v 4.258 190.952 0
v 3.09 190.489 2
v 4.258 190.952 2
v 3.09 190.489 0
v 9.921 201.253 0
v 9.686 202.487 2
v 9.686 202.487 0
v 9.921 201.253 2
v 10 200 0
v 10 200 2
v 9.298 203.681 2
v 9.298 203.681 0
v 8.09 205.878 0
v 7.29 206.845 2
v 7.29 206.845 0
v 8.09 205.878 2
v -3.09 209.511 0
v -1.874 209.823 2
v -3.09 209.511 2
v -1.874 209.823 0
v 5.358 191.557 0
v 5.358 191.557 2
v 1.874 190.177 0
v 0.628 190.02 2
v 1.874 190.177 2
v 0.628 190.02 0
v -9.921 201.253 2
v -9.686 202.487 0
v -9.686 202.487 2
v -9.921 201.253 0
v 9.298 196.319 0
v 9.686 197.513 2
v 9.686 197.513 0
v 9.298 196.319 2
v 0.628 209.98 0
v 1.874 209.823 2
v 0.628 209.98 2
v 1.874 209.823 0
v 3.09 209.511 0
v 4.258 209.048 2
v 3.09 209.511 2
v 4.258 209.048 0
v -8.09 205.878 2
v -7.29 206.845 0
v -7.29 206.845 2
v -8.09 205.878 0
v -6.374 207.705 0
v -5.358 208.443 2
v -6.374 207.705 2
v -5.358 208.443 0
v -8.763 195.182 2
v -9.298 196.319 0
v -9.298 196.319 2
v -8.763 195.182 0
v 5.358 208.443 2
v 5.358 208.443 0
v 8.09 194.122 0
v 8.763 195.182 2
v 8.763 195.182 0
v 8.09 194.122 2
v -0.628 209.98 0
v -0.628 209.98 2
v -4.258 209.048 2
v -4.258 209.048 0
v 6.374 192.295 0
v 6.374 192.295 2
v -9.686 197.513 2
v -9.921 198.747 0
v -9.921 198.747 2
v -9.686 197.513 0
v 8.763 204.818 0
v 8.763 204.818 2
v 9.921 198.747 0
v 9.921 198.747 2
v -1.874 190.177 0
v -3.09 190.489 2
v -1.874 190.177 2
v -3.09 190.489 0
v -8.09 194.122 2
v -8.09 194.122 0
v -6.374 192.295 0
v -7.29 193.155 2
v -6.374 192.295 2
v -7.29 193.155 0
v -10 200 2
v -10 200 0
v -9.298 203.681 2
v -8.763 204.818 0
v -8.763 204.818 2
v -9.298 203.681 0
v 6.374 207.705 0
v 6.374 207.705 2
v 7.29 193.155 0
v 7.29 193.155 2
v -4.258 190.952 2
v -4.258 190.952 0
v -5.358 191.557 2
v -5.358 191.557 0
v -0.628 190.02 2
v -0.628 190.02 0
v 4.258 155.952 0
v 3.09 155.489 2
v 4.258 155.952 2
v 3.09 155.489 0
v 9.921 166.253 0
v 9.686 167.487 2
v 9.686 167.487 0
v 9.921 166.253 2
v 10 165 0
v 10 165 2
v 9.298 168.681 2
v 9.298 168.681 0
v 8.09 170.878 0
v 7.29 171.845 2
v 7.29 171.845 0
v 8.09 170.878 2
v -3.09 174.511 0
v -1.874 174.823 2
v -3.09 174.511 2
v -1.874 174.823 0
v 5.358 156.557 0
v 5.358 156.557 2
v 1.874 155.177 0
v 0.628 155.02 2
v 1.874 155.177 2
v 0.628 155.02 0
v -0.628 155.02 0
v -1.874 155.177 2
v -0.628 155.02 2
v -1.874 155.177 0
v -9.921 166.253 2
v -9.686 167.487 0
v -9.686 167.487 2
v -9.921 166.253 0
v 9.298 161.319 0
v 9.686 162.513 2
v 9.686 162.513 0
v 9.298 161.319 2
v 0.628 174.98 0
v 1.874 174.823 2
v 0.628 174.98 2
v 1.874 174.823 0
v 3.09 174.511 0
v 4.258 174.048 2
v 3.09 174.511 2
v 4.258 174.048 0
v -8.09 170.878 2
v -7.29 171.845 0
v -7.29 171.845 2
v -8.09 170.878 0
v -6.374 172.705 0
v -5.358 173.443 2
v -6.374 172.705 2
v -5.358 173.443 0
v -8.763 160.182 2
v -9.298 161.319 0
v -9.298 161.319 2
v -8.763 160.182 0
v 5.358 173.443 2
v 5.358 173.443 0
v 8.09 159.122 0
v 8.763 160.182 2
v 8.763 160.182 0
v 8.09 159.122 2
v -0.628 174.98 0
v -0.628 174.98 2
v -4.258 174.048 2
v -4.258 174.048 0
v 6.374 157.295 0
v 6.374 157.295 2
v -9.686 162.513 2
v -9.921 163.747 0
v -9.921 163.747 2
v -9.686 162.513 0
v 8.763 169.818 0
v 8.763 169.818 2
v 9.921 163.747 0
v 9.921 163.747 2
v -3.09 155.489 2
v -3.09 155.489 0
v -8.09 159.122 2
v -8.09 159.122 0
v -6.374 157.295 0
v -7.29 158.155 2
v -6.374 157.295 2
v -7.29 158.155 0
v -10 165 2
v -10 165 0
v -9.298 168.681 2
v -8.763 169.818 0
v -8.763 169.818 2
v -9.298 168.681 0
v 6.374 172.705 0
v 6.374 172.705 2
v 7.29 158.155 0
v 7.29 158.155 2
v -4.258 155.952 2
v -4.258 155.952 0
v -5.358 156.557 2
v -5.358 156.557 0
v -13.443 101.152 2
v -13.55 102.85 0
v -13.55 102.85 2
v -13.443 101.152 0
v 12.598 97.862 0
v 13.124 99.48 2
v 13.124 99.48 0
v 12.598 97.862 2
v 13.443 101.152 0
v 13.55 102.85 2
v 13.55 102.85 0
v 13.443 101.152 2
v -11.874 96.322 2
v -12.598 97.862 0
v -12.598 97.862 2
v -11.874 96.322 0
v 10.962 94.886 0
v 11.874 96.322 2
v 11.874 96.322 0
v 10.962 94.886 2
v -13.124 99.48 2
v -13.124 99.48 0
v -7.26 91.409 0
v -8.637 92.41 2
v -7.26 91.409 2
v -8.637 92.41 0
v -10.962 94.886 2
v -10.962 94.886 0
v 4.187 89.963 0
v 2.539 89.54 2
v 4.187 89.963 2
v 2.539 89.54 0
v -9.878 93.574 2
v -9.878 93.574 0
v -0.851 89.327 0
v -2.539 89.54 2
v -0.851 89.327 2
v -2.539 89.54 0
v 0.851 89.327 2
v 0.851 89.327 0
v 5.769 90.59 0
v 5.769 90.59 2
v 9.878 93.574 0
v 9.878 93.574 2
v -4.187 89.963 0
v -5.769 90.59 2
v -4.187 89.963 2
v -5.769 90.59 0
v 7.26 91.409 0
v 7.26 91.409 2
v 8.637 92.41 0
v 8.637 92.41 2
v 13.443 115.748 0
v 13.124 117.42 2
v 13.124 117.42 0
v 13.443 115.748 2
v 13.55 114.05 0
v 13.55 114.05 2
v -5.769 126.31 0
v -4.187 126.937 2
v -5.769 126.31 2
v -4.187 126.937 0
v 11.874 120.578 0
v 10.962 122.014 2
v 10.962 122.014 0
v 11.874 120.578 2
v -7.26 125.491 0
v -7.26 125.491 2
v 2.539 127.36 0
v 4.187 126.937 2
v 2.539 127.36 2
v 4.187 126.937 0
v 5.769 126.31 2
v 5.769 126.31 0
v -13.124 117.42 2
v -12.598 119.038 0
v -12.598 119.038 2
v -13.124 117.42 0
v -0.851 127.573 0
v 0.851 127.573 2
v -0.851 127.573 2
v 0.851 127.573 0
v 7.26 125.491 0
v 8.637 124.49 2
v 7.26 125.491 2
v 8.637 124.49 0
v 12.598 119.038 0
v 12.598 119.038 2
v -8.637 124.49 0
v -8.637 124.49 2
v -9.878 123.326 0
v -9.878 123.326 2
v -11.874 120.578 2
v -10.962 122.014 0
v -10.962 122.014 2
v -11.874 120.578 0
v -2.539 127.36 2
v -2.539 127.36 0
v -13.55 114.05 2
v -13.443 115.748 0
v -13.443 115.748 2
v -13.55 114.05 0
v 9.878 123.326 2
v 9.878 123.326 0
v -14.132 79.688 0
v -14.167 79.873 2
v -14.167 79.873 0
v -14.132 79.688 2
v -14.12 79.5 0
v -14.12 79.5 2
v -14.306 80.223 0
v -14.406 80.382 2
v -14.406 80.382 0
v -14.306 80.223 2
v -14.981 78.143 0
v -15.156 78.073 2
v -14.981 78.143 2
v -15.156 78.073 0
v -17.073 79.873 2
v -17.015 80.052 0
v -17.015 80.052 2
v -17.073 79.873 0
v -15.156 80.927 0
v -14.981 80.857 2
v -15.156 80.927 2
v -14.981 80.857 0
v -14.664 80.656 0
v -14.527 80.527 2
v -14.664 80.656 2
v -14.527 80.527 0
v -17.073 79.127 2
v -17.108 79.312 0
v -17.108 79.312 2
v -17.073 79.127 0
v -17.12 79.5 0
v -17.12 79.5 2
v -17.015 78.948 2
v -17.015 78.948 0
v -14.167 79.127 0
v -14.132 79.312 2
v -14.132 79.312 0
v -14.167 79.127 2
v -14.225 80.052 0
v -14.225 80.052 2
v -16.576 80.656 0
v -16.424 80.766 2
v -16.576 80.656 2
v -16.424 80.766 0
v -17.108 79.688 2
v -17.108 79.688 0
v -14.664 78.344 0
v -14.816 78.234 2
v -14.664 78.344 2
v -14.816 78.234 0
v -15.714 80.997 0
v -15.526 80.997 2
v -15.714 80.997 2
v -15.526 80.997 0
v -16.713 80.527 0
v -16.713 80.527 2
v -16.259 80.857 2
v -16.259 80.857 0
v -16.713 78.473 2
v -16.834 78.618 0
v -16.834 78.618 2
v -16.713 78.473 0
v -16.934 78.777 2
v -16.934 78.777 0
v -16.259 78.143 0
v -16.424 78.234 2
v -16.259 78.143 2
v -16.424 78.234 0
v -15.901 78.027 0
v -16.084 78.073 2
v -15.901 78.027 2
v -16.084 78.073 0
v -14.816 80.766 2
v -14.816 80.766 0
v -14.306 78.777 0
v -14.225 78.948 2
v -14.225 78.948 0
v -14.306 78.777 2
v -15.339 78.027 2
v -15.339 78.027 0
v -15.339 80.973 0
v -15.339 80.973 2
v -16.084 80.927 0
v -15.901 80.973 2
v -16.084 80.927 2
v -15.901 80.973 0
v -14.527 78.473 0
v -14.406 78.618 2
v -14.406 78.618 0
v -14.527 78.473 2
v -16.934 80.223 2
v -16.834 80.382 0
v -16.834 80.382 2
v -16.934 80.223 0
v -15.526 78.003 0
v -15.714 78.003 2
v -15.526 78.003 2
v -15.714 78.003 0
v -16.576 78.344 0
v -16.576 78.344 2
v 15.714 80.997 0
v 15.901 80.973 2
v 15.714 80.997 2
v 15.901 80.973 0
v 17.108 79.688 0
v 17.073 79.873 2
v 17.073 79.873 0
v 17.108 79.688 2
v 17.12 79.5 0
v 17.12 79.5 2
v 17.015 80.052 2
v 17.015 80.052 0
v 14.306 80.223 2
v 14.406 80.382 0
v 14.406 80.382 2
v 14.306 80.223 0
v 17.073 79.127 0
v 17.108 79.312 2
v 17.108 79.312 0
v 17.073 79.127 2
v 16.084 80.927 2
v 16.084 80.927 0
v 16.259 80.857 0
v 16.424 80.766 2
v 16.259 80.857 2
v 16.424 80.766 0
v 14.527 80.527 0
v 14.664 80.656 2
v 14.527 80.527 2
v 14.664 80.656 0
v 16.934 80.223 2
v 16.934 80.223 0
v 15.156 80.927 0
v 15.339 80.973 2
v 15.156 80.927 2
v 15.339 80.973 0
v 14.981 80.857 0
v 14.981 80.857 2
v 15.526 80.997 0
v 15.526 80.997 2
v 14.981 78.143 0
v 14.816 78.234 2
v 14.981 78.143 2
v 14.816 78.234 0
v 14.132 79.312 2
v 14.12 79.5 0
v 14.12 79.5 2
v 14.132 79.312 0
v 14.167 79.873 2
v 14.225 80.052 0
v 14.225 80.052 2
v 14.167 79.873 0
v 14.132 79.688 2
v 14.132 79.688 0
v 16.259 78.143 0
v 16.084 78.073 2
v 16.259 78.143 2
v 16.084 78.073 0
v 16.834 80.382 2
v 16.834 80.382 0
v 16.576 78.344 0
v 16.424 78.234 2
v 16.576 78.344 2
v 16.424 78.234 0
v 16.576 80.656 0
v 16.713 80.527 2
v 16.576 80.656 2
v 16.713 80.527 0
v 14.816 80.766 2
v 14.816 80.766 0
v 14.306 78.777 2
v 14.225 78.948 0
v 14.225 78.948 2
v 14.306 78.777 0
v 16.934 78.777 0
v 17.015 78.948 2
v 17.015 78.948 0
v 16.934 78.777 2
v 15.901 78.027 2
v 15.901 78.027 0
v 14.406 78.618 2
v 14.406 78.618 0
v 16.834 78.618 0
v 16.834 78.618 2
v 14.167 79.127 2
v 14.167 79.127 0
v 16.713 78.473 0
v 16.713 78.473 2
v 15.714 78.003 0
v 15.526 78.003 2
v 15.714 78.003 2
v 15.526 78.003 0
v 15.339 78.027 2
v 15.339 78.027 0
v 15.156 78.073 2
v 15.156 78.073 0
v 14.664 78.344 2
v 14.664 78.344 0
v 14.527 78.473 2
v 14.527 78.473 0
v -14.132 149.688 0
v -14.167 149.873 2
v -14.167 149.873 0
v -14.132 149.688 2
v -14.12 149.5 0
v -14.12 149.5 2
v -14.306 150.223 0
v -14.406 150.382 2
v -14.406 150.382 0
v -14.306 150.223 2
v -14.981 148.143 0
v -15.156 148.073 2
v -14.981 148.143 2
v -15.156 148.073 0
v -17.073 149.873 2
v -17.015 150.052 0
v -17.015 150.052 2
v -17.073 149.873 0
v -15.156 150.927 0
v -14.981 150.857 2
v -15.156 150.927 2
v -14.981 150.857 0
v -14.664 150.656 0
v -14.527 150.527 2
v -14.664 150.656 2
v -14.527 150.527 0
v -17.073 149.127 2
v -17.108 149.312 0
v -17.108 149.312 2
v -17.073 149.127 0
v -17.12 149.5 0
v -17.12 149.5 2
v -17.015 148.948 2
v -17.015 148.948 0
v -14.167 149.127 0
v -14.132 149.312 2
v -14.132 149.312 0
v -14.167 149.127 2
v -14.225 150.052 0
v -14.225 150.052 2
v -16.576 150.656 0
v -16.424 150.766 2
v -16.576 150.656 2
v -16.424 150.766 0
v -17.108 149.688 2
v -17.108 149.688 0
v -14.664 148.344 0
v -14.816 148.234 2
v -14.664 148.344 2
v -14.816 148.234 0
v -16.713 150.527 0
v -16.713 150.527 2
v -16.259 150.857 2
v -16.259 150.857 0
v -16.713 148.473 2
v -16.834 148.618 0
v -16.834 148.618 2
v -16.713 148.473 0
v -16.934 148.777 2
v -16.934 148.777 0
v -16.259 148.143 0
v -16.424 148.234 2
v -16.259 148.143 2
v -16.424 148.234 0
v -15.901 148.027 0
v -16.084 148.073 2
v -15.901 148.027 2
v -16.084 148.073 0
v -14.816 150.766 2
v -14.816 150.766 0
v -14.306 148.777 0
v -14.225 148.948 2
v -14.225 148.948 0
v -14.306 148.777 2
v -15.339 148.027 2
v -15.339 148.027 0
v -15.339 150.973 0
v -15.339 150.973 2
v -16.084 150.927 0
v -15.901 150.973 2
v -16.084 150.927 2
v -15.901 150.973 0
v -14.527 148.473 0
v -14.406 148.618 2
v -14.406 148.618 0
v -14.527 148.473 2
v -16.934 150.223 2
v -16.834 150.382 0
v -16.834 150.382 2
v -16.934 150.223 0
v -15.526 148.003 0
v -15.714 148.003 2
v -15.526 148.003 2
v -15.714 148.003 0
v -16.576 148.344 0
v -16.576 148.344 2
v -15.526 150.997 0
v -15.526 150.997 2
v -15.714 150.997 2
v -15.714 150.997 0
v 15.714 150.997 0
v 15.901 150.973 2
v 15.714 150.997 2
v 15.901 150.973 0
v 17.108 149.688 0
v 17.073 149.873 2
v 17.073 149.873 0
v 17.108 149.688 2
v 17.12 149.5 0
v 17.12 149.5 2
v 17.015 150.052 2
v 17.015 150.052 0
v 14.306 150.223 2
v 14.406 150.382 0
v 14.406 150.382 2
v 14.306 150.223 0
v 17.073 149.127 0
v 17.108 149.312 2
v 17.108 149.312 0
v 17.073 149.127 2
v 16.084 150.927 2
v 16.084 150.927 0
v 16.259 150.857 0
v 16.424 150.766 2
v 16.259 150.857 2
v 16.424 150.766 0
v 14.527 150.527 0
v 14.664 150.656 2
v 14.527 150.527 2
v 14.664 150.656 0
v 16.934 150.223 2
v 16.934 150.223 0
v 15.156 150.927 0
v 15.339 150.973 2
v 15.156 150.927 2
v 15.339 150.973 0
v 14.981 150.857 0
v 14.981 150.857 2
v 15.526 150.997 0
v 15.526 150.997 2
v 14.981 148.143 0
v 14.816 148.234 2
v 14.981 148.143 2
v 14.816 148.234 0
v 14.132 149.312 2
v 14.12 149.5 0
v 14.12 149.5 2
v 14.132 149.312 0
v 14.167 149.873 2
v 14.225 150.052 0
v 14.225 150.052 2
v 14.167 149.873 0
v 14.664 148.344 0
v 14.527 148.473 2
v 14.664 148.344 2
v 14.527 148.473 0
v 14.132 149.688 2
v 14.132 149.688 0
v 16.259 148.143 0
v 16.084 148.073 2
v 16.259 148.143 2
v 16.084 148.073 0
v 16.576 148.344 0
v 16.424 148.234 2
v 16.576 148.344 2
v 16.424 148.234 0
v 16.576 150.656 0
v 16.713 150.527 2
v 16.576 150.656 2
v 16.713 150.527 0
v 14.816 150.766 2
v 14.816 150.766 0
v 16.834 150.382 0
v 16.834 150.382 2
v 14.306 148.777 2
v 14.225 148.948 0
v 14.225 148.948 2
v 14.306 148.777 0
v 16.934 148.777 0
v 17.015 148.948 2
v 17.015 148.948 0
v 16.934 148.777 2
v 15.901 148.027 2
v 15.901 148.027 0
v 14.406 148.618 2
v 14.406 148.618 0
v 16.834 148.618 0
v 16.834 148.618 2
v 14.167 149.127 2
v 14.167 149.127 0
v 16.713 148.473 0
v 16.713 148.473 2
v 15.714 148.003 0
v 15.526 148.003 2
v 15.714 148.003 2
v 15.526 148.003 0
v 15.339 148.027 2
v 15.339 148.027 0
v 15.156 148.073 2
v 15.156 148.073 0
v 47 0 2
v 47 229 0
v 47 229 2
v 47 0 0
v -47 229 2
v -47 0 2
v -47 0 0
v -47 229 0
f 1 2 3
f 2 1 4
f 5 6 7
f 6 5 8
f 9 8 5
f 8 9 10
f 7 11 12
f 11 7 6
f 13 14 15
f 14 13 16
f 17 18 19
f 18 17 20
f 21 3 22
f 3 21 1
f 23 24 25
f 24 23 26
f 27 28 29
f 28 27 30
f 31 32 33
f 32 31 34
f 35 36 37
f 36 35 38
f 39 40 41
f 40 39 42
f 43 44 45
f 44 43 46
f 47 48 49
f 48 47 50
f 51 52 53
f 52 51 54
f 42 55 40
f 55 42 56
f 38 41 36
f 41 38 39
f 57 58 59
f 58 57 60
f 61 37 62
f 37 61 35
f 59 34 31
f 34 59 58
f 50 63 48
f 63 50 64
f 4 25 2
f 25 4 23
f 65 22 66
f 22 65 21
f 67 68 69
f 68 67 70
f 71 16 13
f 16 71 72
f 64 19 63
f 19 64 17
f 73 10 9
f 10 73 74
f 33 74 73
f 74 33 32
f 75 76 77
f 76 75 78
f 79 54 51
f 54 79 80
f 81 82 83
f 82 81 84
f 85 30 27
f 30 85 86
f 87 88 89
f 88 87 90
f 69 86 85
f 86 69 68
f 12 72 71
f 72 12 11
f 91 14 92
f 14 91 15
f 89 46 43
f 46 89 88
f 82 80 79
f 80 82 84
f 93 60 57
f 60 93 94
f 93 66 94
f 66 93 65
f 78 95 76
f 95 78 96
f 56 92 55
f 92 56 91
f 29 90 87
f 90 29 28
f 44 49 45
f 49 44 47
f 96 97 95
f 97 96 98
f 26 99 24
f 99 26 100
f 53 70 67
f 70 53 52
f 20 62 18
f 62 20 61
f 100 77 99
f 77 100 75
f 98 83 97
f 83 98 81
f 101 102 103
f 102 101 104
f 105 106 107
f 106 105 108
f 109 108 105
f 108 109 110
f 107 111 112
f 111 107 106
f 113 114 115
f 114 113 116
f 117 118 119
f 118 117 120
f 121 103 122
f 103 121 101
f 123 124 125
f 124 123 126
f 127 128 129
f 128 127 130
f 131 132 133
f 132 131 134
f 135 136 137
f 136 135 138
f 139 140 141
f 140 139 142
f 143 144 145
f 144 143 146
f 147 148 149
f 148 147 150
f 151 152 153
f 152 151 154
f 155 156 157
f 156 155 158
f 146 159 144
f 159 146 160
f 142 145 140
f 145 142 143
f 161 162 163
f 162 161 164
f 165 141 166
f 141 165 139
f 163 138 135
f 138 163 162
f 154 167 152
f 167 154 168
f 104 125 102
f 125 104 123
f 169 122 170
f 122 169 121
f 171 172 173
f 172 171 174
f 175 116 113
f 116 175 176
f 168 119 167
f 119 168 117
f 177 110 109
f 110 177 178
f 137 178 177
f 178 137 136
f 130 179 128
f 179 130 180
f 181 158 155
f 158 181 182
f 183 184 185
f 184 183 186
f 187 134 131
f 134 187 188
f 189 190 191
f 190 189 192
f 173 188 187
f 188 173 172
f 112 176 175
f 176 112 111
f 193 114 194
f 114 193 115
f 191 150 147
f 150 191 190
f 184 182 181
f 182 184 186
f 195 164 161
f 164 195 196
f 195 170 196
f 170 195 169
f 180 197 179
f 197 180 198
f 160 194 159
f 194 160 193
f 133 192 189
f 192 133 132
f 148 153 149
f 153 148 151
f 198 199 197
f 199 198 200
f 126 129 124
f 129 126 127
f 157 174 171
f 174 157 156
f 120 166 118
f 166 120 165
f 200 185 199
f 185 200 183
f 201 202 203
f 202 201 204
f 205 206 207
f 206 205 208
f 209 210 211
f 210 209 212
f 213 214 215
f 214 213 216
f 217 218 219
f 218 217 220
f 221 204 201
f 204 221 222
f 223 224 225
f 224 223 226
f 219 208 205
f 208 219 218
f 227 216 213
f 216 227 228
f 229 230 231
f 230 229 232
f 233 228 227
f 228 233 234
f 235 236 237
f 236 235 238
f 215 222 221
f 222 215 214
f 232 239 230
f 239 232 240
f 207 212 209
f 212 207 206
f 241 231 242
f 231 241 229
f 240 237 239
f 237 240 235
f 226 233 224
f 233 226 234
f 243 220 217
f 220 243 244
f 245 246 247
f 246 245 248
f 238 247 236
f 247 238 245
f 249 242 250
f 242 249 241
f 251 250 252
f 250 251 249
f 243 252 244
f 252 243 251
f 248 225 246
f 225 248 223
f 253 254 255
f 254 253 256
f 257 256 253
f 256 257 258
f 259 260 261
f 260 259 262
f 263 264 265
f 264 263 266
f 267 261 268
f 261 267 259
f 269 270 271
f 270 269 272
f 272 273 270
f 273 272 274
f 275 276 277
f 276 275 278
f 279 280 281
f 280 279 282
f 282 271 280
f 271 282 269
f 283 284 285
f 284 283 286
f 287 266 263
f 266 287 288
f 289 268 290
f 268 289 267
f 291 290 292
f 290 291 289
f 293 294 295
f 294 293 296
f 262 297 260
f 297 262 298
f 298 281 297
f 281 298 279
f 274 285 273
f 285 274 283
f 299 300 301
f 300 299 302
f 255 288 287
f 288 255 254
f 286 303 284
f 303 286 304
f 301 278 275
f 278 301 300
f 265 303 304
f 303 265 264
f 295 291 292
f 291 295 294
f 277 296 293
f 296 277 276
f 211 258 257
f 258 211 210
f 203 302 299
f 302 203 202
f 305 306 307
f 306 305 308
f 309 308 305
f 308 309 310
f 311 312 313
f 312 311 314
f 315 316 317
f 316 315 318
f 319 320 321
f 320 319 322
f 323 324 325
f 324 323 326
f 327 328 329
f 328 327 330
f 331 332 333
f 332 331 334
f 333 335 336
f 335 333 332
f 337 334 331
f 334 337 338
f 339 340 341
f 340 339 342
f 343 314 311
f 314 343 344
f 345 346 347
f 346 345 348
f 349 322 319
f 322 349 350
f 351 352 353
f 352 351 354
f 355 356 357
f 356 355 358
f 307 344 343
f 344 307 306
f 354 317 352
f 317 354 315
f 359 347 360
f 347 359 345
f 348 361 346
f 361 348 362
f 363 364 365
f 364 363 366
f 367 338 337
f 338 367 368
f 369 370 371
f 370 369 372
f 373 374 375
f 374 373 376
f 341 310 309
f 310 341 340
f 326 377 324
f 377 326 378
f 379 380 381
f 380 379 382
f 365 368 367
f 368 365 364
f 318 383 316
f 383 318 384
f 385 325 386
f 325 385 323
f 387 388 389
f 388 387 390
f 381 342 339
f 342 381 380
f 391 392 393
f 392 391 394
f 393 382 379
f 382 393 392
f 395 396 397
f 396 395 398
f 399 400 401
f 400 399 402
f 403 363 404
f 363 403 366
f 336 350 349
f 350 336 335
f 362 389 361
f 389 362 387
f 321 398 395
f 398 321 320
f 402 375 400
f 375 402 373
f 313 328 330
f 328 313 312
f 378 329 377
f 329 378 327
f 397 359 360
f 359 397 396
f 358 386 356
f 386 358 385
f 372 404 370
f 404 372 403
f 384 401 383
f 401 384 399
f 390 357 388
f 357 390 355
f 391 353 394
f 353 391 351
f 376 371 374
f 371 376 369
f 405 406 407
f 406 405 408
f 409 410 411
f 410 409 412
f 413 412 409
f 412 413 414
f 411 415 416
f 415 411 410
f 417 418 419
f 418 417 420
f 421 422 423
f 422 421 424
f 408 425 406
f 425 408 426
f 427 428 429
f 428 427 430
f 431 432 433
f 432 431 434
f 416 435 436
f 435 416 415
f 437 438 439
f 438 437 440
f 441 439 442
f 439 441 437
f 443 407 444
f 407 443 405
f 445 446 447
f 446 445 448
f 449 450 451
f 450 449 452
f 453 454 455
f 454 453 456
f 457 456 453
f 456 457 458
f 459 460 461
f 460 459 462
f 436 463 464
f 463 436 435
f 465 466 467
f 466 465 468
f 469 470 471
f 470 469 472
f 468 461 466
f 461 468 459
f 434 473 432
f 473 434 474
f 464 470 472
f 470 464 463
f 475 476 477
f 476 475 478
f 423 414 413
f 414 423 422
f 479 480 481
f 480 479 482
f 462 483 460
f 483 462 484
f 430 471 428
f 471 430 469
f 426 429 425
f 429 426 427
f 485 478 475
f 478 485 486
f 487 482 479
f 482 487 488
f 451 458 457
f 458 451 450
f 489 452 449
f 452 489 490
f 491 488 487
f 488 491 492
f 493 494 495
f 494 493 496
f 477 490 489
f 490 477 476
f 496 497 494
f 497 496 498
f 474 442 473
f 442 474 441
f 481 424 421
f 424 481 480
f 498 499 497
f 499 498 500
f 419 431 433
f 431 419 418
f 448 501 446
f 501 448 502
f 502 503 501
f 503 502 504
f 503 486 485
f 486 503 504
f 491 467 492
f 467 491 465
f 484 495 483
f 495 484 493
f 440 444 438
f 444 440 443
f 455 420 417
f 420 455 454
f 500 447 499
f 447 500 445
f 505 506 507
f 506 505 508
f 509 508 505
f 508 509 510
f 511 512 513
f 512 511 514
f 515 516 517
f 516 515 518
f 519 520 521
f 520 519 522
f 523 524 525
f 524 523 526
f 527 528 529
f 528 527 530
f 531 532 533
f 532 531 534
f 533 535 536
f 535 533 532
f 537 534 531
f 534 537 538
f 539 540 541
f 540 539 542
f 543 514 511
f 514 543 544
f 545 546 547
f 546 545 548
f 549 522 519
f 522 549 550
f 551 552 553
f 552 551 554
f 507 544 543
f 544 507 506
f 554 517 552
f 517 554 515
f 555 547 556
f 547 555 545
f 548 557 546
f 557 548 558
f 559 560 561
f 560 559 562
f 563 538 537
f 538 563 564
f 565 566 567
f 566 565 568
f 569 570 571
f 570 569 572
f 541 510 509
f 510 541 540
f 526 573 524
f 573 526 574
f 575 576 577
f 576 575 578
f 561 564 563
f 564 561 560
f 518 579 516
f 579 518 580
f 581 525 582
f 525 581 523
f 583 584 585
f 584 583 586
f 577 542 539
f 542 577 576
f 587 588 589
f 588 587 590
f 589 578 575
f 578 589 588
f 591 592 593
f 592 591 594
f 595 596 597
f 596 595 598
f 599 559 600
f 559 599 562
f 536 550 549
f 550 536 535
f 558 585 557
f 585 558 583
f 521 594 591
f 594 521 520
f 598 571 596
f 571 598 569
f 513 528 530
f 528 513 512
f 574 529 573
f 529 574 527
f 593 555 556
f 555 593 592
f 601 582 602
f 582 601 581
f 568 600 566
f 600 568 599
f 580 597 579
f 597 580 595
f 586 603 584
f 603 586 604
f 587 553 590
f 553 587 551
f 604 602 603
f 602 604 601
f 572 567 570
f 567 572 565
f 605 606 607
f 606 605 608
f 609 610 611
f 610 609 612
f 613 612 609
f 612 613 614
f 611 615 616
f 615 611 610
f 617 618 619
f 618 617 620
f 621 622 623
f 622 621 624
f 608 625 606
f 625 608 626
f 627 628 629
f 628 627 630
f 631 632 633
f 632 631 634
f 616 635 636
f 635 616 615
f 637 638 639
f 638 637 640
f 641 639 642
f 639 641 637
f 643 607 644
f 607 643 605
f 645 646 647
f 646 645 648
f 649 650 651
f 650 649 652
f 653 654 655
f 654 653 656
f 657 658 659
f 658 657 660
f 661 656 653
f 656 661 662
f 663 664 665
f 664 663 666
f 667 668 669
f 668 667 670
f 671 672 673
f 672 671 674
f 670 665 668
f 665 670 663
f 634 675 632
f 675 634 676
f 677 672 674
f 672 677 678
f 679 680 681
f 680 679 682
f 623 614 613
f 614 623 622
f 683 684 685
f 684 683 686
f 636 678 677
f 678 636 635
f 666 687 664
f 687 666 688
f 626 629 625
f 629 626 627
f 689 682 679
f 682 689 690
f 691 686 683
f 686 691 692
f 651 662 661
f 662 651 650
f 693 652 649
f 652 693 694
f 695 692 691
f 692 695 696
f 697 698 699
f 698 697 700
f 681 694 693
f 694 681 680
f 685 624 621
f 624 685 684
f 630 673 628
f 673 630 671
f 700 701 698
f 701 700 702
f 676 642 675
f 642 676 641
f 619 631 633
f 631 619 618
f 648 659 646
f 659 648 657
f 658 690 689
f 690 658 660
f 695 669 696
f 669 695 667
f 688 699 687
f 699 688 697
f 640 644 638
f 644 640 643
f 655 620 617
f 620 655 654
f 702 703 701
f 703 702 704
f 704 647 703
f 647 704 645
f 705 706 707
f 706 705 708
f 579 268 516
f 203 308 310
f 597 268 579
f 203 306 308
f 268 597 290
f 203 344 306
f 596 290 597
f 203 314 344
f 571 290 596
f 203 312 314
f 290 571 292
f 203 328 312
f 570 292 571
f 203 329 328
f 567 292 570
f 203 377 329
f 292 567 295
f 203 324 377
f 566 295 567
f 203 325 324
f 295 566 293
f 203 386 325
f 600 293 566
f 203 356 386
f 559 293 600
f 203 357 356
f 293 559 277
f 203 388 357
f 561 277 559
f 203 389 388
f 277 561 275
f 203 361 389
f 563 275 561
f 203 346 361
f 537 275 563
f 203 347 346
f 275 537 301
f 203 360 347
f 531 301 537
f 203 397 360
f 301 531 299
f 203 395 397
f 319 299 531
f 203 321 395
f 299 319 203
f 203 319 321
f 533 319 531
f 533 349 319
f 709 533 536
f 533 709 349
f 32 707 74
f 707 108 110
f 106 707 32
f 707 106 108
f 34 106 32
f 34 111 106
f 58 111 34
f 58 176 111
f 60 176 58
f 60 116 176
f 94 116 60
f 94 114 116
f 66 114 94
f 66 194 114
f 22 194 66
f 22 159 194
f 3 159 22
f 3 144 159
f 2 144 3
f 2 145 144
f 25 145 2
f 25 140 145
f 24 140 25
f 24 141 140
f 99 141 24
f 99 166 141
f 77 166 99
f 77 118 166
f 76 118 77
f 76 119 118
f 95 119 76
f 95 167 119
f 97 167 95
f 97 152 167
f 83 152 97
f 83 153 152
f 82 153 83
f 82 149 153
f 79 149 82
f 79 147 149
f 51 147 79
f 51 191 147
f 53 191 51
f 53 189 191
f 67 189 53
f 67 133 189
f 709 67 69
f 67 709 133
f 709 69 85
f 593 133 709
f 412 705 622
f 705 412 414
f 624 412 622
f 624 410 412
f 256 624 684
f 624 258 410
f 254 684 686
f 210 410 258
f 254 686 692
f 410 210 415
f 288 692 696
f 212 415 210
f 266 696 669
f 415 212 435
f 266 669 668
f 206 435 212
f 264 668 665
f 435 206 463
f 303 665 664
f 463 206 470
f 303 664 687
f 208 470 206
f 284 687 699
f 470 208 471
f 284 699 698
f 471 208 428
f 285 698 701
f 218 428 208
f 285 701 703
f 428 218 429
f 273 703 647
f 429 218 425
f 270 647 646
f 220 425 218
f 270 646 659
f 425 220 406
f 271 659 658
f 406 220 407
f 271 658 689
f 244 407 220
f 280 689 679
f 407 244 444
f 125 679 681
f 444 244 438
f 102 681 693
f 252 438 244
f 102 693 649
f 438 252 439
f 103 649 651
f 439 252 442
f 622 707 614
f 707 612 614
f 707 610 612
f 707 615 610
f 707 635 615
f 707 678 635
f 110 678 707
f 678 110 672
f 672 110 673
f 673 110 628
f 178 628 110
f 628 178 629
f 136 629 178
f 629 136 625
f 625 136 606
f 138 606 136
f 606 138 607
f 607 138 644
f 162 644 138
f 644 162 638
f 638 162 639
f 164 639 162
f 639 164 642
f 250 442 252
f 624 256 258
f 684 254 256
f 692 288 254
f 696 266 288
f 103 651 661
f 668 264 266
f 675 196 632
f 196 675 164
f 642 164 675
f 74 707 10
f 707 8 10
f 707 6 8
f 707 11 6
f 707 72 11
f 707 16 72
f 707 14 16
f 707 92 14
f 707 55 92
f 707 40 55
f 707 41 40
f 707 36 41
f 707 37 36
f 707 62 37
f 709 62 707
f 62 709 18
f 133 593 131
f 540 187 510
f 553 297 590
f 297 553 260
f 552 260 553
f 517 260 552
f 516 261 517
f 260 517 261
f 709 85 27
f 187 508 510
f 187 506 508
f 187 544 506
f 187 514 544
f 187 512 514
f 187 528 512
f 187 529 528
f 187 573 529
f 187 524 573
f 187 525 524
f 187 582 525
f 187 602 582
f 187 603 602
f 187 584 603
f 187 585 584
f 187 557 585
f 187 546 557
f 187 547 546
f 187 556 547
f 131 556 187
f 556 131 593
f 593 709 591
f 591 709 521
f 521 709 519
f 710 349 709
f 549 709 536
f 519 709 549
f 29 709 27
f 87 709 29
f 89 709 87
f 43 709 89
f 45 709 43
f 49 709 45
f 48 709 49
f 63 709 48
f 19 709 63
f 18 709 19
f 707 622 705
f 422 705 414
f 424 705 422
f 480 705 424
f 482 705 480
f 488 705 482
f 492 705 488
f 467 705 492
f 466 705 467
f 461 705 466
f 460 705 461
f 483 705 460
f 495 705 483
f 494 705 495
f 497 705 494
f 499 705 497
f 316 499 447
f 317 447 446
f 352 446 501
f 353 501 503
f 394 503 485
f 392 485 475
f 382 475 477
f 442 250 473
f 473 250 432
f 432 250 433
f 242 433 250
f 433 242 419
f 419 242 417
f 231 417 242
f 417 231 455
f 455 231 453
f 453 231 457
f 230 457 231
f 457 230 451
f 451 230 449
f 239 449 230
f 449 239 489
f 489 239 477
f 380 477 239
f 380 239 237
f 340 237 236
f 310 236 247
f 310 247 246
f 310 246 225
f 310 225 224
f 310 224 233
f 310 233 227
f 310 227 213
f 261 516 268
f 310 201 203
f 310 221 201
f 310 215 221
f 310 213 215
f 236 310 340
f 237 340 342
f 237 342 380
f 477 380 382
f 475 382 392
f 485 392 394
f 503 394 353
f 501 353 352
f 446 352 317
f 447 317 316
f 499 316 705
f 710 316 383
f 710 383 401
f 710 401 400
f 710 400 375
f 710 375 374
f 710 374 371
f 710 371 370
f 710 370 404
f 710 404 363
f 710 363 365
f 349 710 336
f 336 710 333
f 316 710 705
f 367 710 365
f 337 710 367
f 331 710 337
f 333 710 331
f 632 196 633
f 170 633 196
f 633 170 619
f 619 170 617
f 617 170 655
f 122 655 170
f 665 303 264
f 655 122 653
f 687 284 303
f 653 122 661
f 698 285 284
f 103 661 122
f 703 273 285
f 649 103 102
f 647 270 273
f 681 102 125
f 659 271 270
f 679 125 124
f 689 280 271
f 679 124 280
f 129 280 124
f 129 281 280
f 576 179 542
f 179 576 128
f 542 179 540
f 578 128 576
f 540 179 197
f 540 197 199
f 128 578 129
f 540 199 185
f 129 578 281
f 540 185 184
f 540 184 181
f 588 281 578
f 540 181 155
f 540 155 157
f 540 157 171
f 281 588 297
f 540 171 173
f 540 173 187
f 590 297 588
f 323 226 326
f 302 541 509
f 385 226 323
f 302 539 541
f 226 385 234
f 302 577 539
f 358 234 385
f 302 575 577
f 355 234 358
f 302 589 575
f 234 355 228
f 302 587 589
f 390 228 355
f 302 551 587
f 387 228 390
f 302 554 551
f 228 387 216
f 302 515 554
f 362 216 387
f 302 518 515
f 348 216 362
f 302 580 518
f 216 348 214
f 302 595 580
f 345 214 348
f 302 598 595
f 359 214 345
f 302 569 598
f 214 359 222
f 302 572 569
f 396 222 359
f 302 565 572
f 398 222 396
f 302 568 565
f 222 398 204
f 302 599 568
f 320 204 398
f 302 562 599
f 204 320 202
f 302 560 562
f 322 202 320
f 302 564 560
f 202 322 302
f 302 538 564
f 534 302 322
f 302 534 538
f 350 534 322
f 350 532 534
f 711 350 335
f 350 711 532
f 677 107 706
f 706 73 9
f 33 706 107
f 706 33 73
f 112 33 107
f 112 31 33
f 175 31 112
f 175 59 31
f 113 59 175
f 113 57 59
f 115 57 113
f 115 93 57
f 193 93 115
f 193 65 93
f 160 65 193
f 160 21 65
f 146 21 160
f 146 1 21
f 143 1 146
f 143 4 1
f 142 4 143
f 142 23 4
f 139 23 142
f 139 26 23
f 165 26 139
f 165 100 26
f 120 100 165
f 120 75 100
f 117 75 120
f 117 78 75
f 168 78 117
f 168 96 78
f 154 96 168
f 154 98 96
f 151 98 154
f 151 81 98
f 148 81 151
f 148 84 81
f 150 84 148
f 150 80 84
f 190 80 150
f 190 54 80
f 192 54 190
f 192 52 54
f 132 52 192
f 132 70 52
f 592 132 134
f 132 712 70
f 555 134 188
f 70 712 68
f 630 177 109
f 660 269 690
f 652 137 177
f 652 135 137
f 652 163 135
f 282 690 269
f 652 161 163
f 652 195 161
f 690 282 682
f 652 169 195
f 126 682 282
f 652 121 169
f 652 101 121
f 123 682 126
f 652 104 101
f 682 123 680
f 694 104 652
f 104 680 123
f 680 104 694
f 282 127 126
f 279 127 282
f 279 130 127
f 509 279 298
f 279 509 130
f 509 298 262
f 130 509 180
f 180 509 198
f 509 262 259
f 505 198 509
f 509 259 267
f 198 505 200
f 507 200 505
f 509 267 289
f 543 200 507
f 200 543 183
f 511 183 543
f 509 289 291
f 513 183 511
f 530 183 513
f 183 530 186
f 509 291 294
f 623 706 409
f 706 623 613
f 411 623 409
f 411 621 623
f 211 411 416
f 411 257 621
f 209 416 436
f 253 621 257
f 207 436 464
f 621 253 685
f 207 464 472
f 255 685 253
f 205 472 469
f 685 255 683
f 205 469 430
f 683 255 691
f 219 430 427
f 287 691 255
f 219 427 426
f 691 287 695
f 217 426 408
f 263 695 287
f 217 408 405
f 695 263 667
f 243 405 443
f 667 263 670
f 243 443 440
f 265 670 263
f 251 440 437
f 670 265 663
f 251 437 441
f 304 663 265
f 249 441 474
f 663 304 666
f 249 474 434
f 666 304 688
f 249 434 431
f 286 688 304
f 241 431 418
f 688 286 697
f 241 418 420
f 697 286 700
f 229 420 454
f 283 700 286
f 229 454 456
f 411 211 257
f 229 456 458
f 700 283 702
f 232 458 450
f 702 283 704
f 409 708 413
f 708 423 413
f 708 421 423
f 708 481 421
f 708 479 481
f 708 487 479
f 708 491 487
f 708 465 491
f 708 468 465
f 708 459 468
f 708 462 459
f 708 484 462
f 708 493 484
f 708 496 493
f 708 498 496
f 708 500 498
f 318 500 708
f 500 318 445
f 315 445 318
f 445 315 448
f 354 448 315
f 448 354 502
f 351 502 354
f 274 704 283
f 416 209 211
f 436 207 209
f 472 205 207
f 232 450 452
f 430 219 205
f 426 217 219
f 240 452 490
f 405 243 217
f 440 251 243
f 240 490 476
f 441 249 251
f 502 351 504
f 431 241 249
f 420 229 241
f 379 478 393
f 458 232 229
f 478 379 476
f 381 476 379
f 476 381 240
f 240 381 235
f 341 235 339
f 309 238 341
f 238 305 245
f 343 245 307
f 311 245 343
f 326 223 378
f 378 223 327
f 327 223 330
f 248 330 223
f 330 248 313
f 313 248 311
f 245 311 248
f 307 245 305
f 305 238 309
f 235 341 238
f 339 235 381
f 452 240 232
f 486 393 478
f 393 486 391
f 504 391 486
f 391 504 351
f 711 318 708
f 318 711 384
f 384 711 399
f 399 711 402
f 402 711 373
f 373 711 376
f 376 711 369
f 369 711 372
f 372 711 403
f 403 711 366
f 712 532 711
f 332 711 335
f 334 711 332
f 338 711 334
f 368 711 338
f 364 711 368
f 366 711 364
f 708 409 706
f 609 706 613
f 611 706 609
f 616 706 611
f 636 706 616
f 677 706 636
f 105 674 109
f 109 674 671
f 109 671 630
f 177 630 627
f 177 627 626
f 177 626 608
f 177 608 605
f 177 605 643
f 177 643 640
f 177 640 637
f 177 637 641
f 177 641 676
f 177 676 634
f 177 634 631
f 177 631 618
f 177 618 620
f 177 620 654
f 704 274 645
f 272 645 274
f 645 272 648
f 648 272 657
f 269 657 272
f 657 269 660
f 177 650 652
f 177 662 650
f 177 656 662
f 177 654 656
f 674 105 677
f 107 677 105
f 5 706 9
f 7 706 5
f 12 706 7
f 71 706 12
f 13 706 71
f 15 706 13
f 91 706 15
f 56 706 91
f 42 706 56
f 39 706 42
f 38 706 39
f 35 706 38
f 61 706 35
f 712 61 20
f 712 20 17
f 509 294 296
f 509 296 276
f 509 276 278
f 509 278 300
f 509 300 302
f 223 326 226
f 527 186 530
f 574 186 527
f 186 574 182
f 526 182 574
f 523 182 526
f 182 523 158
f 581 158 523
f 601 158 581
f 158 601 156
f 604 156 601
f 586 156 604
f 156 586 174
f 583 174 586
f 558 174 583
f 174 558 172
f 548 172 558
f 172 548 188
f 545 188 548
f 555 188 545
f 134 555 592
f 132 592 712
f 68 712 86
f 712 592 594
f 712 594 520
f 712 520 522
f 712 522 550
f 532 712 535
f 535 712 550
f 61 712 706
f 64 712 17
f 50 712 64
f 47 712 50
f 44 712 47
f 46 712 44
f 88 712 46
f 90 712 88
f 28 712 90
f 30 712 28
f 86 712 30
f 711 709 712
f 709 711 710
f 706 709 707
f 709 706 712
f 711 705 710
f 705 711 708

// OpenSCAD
// file: haut_parleur_HP8R.scad
include <parametre.scad>

// pour exporter en .dxf
//projection(cut = false) 
haut_parleur_HP8R();

module haut_parleur_HP8R() {
	color([0.3, 0.3, 0.3])
		difference() {
			union() {
				// la plaque de fixation
				cube(size=[HP8R_largeur, HP8R_hauteur, HP8R_epaisseur_tole]);
				// le caisson
				translate([0, (HP8R_hauteur - HP8R_hauteur_caisson) / 2, 0])
					cube(size=[HP8R_largeur, HP8R_hauteur_caisson, HP8R_epaisseur_totale]);
			}

			// les 4 coins
			translate([HP8R_diametre_creuse_coins / 4, HP8R_diametre_creuse_coins / 4, HP8R_epaisseur_tole])
				cylinder(HP8R_epaisseur_totale + difference_objet_marge, d=HP8R_diametre_creuse_coins, $fn=resolution);
			translate([HP8R_largeur - HP8R_diametre_creuse_coins / 2 + HP8R_diametre_creuse_coins / 4, HP8R_diametre_creuse_coins / 4, HP8R_epaisseur_tole])
				cylinder(HP8R_epaisseur_totale + difference_objet_marge, d=HP8R_diametre_creuse_coins, $fn=resolution);
			translate([HP8R_diametre_creuse_coins / 4, HP8R_hauteur - HP8R_diametre_creuse_coins / 2 + HP8R_diametre_creuse_coins / 4, HP8R_epaisseur_tole])
				cylinder(HP8R_epaisseur_totale + difference_objet_marge, d=HP8R_diametre_creuse_coins, $fn=resolution);
			translate([HP8R_largeur - HP8R_diametre_creuse_coins / 2 + HP8R_diametre_creuse_coins / 4, HP8R_hauteur - HP8R_diametre_creuse_coins / 2 + HP8R_diametre_creuse_coins / 4, HP8R_epaisseur_tole])
				cylinder(HP8R_epaisseur_totale + difference_objet_marge, d=HP8R_diametre_creuse_coins, $fn=resolution);

			haut_parleur_HP8R_trous();
		}

}

module haut_parleur_HP8R_trouHP() {
	union() {
		// arrondi HP
		translate([HP8R_largeur / 2, HP8R_decalage_hauteur_trou + HP8R_largeur_trou / 2, -difference_objet_marge])
			cylinder(HP8R_epaisseur_trou + difference_objet_marge, d=HP8R_largeur_trou, $fn=resolution);
		translate([HP8R_largeur / 2, HP8R_decalage_hauteur_trou + HP8R_hauteur_trou - HP8R_largeur_trou / 2, -difference_objet_marge])
			cylinder(HP8R_epaisseur_trou + difference_objet_marge, d=HP8R_largeur_trou, $fn=resolution);

		// le trou HP
		translate([(HP8R_largeur - HP8R_largeur_trou) / 2, HP8R_decalage_hauteur_trou + HP8R_largeur_trou / 2, -difference_objet_marge])
				cube(size=[HP8R_largeur_trou, HP8R_hauteur_trou - HP8R_largeur_trou, HP8R_epaisseur_trou + difference_objet_marge]);
	}
}

module haut_parleur_HP8R_trousFixation() {
	// les 4 trous pour fixation
	translate([HP8R_diametre_creuse_coins / 4, HP8R_diametre_creuse_coins / 4, -difference_objet_marge/2])
		cylinder(HP8R_epaisseur_tole + difference_objet_marge, d=HP8R_diametre_creuse_fixation, $fn=resolution);
	translate([HP8R_largeur - HP8R_diametre_creuse_coins / 2 + HP8R_diametre_creuse_coins / 4, HP8R_diametre_creuse_coins / 4, -difference_objet_marge/2])
		cylinder(HP8R_epaisseur_tole + difference_objet_marge, d=HP8R_diametre_creuse_fixation, $fn=resolution);
	translate([HP8R_diametre_creuse_coins / 4, HP8R_hauteur - HP8R_diametre_creuse_coins / 2 + HP8R_diametre_creuse_coins / 4, -difference_objet_marge/2])
		cylinder(HP8R_epaisseur_tole + difference_objet_marge, d=HP8R_diametre_creuse_fixation, $fn=resolution);
	translate([HP8R_largeur - HP8R_diametre_creuse_coins / 2 + HP8R_diametre_creuse_coins / 4, HP8R_hauteur - HP8R_diametre_creuse_coins / 2 + HP8R_diametre_creuse_coins / 4, -difference_objet_marge/2])
		cylinder(HP8R_epaisseur_tole + difference_objet_marge, d=HP8R_diametre_creuse_fixation, $fn=resolution);
}

module haut_parleur_HP8R_trous() {
	haut_parleur_HP8R_trouHP();
	haut_parleur_HP8R_trousFixation();
}
// file: bouton_arcade.scad
include <parametre.scad>

module bouton_arcade() {
	cylinder(3, d=diametre_bouton_arcade, $fn=resolution);
}

module trou_bouton_arcade(epaisseur) {
	cylinder(epaisseur + padding_percage, d=diametre_trou_bouton_arcade, $fn=resolution);
}
// file: parametre.scad
/* pour le rendu openscad */

// pour la finesse de rendu
// plus c'est élevé, mieux c'est... mais ça prend plus de temps et de ressource
resolution = 50;

// pour enlever de la matière des objets dans openscad et être certain qu'il ne reste pas un bout de face
difference_objet_marge = 20;





/* pour le design du jeu  */

// tout est en millimetre !!!!

// configuration globale
////////////////////////

// quand on perce et que l'on va insérer quelque chose dedans...
// il faut un peu de vide en plus ;)
padding_percage = 0.5;

// espace supplémentaire pour la largeur de rainure
padding_rainure = 1;

// profondeur standard pour une rainure
profondeur_rainure = 2; // moins que epaisseur_tole_grille_led et que epaisseur_tole_grille_led ! Il faut qu'il reste de la matière !

// définition de base du jeu
nombre_colonnes = 7;
nombre_lignes = 6;


// les boutons de sélection de colonne et du nombre de joueurs
//////////////////////////////////////////////////////////////
diametre_bouton_arcade = 30;
rayon_bouton_arcade = diametre_bouton_arcade / 2;
diametre_trou_bouton_arcade = 20; // TODO: à valider !
rayon_trou_bouton_arcade = diametre_trou_bouton_arcade / 2;


// haut-parleur HP8R
////////////////////
HP8R_epaisseur_totale = 16.25;
HP8R_largeur = 36.24;
HP8R_hauteur = 75;
HP8R_epaisseur_tole = 1.63;
HP8R_hauteur_caisson = 71;
//HP8R_epaisseur_caisson = 16.25 - HP8R_epaisseur_tole;
HP8R_decalage_hauteur_trou = 12.3;
HP8R_largeur_trou = 27.1;
HP8R_hauteur_trou = 38.3;
HP8R_epaisseur_trou = HP8R_epaisseur_totale - 2;
HP8R_diametre_creuse_coins = 10;
HP8R_diametre_creuse_fixation = 3;


// cadrillage autour des LEDs
/////////////////////////////
profondeur_separateur_led = 15; // TODO: à valider !


// la grille de LEDS
////////////////////
epaisseur_tole_grille_led = 3;
diametre_trou_led = 10; // TODO: à valider !
largeur_rainure_grille_led = epaisseur_tole_grille_led + padding_rainure;
profondeur_rainure_grille_led = profondeur_rainure; // moins que epaisseur_tole_grille_led !!!


// pour stocker les cables et l'électronique
////////////////////////////////////////////
espace_vide_milieu = 40; // TODO: à valider !


// le plexi blanc derrière le mur, pour faire les fenêtres
//////////////////////////////////////////////////////////
epaisseur_plexi_blanc = 2;
transparence_plexi = 1;


// le mur Star Wars fenetré
///////////////////////////
epaisseur_tole_mur = 2;
taille_fenetre = diametre_bouton_arcade; // valeur à fixer si bouton plus petit, ici je m'adapte à cette taille de bouton
ecart_entre_fenetre = 5; // au jugé ;)
marge_mur = 10; // pour aérer le tour

// on peut maintenant calculer la surface du jeu !
largeur_mur = marge_mur + (nombre_colonnes * taille_fenetre) + ((nombre_colonnes - 1) * ecart_entre_fenetre) + marge_mur;
echo("largeur_mur=", largeur_mur);
hauteur_mur = marge_mur + (nombre_lignes * taille_fenetre) + ((nombre_lignes - 1) * ecart_entre_fenetre) + marge_mur;
echo("hauteur_mur=", hauteur_mur);

// calcul de l'épaisseur complète du jeu
epaisseur_jeu = espace_vide_milieu + 2 * epaisseur_tole_mur + 2 * epaisseur_plexi_blanc + 2 * epaisseur_tole_grille_led + 2 * profondeur_separateur_led;


// la plaque du dessus avec les boutons de choix de colonne
///////////////////////////////////////////////////////////
epaisseur_tole_dessus = 4; // ce "chapeau" sera rainurée pour tenir les plaques !
debord_rainure = 5; // qui dépasse de devant et derrière 
profondeur_dessus = epaisseur_jeu + 2 * debord_rainure;
marge_largeur_dessus = (largeur_mur - (nombre_colonnes * diametre_bouton_arcade) - ((nombre_colonnes - 1) * ecart_entre_fenetre)) / 2;
largeur_rainure_mur_plexi = epaisseur_tole_mur + epaisseur_plexi_blanc + padding_rainure;
profondeur_rainure_mur_plexi = profondeur_rainure; // moins que epaisseur_tole_dessus !!!
echo("profondeur_dessus=", profondeur_dessus);


// la plaque de dessous
///////////////////////
epaisseur_tole_dessous = 4; // ce socle sera rainurée pour tenir les plaques !
dessous_debord_rainure = 50;
profondeur_dessous = epaisseur_jeu + 2 * dessous_debord_rainure;
echo("profondeur_dessous=", profondeur_dessous);


hauteur_cote = epaisseur_tole_dessous + hauteur_mur + epaisseur_tole_dessus - 2 * profondeur_rainure_grille_led;
largeur_cote = profondeur_dessus;


// côté gauche
//////////////
epaisseur_tole_gauche = 2;


// côté droit
/////////////
epaisseur_tole_droit = 2;
// main file
include <parametre.scad>
use <bouton_arcade.scad>
use <haut_parleur_HP8R.scad>

// pour exporter en .dxf
//projection(cut = false) cote_droit();
translate([-largeur_cote / 2, 0, 0])
	cote_droit();

// plaque mur déco
module cote_droit() {
    color([0, 0, 0]) {
        difference() {
			// une belle dalle
            cube(size=[largeur_cote, hauteur_cote, epaisseur_tole_droit]);
			
			// les trous player 1 et player 2
			pose_trous_bouton();
			
			// trou haut-parleur
			translate([(largeur_cote - HP8R_largeur) / 2, (hauteur_cote - HP8R_hauteur) / 2, 0])
				haut_parleur_HP8R_trous();
		}
	}
}

module pose_trous_bouton() {
	translate([largeur_cote / 2, 
			hauteur_cote - rayon_bouton_arcade - epaisseur_tole_dessus - marge_mur, 
			- difference_objet_marge / 2]) 
		trou_bouton_arcade(epaisseur_tole_droit + difference_objet_marge);

	translate([largeur_cote / 2, 
			hauteur_cote- rayon_bouton_arcade - epaisseur_tole_dessus - marge_mur - taille_fenetre - ecart_entre_fenetre, 
			- difference_objet_marge / 2]) 
		trou_bouton_arcade(epaisseur_tole_droit + difference_objet_marge);
}
